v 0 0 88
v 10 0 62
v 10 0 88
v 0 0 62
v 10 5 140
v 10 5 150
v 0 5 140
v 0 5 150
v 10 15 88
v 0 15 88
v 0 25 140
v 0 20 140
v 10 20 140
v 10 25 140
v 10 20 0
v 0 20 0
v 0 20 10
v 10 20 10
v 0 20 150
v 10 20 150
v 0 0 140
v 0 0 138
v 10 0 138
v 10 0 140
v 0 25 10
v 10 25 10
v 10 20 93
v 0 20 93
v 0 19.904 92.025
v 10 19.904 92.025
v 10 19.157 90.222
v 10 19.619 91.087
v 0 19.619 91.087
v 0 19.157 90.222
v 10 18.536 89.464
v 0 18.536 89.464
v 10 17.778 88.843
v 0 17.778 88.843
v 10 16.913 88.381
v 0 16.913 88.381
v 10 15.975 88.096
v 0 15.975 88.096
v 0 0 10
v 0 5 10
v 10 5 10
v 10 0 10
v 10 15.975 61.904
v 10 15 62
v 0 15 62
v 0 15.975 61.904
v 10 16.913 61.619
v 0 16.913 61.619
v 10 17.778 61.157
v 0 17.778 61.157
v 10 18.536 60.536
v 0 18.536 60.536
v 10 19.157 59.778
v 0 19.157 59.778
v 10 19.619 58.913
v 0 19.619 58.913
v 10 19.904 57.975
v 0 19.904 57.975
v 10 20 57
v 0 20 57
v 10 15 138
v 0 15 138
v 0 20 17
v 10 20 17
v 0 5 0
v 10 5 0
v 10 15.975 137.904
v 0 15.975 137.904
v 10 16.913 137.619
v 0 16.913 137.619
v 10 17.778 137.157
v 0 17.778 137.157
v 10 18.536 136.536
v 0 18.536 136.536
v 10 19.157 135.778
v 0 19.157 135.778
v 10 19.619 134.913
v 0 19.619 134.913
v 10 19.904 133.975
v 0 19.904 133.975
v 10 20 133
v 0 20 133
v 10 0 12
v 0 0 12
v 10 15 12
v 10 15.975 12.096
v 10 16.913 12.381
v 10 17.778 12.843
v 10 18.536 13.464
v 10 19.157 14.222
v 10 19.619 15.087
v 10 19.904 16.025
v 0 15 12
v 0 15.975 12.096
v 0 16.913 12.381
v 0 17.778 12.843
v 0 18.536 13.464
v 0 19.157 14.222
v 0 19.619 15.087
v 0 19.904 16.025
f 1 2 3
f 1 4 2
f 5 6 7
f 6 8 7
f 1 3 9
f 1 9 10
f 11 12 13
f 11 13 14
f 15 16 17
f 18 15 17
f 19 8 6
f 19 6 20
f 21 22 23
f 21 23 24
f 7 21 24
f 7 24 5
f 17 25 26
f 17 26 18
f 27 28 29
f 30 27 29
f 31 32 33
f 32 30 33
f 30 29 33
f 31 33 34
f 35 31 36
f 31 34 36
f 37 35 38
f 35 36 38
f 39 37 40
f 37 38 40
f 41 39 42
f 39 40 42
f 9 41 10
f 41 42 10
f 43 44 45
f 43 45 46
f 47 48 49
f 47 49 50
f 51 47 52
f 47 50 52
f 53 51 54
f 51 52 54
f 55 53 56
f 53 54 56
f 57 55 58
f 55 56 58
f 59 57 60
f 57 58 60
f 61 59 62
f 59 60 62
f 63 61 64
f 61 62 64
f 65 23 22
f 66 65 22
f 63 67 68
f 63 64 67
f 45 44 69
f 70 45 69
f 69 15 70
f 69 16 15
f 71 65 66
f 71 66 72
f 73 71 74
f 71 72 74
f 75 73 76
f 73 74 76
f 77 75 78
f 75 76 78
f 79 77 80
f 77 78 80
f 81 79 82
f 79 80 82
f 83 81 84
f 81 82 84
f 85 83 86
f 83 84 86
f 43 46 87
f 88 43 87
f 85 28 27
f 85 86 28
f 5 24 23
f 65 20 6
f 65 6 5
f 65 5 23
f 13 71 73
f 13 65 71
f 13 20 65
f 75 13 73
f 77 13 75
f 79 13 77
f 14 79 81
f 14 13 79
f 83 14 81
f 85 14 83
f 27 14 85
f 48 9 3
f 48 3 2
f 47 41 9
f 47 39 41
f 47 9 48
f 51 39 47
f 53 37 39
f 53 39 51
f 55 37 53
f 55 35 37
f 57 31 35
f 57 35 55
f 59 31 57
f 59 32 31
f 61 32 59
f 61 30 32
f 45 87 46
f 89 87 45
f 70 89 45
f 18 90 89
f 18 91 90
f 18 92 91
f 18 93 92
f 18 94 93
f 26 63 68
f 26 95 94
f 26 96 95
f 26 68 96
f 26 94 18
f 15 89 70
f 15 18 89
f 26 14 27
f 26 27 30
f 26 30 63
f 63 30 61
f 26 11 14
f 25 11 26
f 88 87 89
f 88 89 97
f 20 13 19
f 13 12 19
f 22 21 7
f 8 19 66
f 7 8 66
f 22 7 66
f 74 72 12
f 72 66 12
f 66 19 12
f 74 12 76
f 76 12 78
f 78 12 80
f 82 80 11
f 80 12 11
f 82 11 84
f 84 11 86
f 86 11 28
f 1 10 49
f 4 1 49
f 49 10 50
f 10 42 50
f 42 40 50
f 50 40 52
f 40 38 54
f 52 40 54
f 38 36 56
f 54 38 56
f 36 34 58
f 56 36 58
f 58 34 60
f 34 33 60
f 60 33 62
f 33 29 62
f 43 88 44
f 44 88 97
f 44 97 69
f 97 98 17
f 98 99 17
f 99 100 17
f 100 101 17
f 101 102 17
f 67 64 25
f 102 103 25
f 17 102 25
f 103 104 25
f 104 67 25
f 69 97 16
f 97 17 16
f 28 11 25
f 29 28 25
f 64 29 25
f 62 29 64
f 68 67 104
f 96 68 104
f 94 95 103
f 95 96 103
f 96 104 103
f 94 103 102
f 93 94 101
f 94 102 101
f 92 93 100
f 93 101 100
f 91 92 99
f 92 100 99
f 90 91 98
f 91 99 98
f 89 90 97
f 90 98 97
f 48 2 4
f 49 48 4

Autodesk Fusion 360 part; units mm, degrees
sketch "Sketch1" plane through (0, 0, 0) normal (1, 0, 0) x (0, 0, -1)
  line L0 (0, 0) -> (-150, 0)
  line L1 (-150, 0) -> (-150, 25)
  line L2 (-150, 25) -> (0, 25)
  line L3 (0, 25) -> (0, 0)
  line L4 (-10, 0) -> (-140, 0)
  line L5 (-140, 0) -> (-140, 25)
  line L6 (-140, 25) -> (-10, 25)
  line L7 (-10, 25) -> (-10, 0)
  line L8 (-140, 20) -> (-150, 20)
  line L9 (-150, 20) -> (-150, 5)
  line L10 (-150, 5) -> (-140, 5)
  line L11 (-140, 5) -> (-140, 20)
  line L12 (-10, 5) -> (0, 5)
  line L13 (0, 5) -> (0, 20)
  line L14 (0, 20) -> (-10, 20)
  line L15 (-10, 20) -> (-10, 5)
  dimension "d1" = 150
  dimension "d2" = 25
  dimension "d3" = 130
  dimension "d4" = 25
extrude "Extrude1" add sketch "Sketch1" along normal blind 10 contours L0 L2 L4 L5 L6 L7 L11 L15 | L3 L7 L12 L13 L14 L15 | L1 L5 L8 L9 L10 L11
sketch "Sketch2" plane through (0, 0, 0) normal (0, -1, 0) x (1, 0, 0)
  line L0 (0, 140) -> (0, 10)
  line L1 (0, 10) -> (10, 10)
  line L2 (10, 10) -> (10, 140)
  line L3 (10, 140) -> (0, 140)
  line L4 (0, 140) -> (10, 140)
  line L5 (10, 140) -> (10, 88)
  line L6 (10, 88) -> (0, 88)
  line L7 (0, 88) -> (0, 140)
  line L8 (0, 10) -> (10, 10)
  line L9 (10, 10) -> (10, 62)
  line L10 (10, 62) -> (0, 62)
  line L11 (0, 62) -> (0, 10)
  line L12 (0, 140) -> (10, 140)
  line L13 (10, 140) -> (10, 138)
  line L14 (10, 138) -> (0, 138)
  line L15 (0, 138) -> (0, 140)
  line L16 (0, 10) -> (10, 10)
  line L17 (10, 10) -> (10, 12)
  line L18 (10, 12) -> (0, 12)
  line L19 (0, 12) -> (0, 10)
  dimension "d7" = 52
  dimension "d8" = 52
  dimension "d9" = 2
extrude "Extrude2" cut sketch "Sketch2" against normal blind 20 contours L0 L2 L5 L6 L7 L14 | L0 L2 L9 L10 L11 L18
fillet "Fillet1" radius 5 4 edges at (5, 20, 138) (5, 20, 88) (5, 20, 62) (5, 20, 12)
